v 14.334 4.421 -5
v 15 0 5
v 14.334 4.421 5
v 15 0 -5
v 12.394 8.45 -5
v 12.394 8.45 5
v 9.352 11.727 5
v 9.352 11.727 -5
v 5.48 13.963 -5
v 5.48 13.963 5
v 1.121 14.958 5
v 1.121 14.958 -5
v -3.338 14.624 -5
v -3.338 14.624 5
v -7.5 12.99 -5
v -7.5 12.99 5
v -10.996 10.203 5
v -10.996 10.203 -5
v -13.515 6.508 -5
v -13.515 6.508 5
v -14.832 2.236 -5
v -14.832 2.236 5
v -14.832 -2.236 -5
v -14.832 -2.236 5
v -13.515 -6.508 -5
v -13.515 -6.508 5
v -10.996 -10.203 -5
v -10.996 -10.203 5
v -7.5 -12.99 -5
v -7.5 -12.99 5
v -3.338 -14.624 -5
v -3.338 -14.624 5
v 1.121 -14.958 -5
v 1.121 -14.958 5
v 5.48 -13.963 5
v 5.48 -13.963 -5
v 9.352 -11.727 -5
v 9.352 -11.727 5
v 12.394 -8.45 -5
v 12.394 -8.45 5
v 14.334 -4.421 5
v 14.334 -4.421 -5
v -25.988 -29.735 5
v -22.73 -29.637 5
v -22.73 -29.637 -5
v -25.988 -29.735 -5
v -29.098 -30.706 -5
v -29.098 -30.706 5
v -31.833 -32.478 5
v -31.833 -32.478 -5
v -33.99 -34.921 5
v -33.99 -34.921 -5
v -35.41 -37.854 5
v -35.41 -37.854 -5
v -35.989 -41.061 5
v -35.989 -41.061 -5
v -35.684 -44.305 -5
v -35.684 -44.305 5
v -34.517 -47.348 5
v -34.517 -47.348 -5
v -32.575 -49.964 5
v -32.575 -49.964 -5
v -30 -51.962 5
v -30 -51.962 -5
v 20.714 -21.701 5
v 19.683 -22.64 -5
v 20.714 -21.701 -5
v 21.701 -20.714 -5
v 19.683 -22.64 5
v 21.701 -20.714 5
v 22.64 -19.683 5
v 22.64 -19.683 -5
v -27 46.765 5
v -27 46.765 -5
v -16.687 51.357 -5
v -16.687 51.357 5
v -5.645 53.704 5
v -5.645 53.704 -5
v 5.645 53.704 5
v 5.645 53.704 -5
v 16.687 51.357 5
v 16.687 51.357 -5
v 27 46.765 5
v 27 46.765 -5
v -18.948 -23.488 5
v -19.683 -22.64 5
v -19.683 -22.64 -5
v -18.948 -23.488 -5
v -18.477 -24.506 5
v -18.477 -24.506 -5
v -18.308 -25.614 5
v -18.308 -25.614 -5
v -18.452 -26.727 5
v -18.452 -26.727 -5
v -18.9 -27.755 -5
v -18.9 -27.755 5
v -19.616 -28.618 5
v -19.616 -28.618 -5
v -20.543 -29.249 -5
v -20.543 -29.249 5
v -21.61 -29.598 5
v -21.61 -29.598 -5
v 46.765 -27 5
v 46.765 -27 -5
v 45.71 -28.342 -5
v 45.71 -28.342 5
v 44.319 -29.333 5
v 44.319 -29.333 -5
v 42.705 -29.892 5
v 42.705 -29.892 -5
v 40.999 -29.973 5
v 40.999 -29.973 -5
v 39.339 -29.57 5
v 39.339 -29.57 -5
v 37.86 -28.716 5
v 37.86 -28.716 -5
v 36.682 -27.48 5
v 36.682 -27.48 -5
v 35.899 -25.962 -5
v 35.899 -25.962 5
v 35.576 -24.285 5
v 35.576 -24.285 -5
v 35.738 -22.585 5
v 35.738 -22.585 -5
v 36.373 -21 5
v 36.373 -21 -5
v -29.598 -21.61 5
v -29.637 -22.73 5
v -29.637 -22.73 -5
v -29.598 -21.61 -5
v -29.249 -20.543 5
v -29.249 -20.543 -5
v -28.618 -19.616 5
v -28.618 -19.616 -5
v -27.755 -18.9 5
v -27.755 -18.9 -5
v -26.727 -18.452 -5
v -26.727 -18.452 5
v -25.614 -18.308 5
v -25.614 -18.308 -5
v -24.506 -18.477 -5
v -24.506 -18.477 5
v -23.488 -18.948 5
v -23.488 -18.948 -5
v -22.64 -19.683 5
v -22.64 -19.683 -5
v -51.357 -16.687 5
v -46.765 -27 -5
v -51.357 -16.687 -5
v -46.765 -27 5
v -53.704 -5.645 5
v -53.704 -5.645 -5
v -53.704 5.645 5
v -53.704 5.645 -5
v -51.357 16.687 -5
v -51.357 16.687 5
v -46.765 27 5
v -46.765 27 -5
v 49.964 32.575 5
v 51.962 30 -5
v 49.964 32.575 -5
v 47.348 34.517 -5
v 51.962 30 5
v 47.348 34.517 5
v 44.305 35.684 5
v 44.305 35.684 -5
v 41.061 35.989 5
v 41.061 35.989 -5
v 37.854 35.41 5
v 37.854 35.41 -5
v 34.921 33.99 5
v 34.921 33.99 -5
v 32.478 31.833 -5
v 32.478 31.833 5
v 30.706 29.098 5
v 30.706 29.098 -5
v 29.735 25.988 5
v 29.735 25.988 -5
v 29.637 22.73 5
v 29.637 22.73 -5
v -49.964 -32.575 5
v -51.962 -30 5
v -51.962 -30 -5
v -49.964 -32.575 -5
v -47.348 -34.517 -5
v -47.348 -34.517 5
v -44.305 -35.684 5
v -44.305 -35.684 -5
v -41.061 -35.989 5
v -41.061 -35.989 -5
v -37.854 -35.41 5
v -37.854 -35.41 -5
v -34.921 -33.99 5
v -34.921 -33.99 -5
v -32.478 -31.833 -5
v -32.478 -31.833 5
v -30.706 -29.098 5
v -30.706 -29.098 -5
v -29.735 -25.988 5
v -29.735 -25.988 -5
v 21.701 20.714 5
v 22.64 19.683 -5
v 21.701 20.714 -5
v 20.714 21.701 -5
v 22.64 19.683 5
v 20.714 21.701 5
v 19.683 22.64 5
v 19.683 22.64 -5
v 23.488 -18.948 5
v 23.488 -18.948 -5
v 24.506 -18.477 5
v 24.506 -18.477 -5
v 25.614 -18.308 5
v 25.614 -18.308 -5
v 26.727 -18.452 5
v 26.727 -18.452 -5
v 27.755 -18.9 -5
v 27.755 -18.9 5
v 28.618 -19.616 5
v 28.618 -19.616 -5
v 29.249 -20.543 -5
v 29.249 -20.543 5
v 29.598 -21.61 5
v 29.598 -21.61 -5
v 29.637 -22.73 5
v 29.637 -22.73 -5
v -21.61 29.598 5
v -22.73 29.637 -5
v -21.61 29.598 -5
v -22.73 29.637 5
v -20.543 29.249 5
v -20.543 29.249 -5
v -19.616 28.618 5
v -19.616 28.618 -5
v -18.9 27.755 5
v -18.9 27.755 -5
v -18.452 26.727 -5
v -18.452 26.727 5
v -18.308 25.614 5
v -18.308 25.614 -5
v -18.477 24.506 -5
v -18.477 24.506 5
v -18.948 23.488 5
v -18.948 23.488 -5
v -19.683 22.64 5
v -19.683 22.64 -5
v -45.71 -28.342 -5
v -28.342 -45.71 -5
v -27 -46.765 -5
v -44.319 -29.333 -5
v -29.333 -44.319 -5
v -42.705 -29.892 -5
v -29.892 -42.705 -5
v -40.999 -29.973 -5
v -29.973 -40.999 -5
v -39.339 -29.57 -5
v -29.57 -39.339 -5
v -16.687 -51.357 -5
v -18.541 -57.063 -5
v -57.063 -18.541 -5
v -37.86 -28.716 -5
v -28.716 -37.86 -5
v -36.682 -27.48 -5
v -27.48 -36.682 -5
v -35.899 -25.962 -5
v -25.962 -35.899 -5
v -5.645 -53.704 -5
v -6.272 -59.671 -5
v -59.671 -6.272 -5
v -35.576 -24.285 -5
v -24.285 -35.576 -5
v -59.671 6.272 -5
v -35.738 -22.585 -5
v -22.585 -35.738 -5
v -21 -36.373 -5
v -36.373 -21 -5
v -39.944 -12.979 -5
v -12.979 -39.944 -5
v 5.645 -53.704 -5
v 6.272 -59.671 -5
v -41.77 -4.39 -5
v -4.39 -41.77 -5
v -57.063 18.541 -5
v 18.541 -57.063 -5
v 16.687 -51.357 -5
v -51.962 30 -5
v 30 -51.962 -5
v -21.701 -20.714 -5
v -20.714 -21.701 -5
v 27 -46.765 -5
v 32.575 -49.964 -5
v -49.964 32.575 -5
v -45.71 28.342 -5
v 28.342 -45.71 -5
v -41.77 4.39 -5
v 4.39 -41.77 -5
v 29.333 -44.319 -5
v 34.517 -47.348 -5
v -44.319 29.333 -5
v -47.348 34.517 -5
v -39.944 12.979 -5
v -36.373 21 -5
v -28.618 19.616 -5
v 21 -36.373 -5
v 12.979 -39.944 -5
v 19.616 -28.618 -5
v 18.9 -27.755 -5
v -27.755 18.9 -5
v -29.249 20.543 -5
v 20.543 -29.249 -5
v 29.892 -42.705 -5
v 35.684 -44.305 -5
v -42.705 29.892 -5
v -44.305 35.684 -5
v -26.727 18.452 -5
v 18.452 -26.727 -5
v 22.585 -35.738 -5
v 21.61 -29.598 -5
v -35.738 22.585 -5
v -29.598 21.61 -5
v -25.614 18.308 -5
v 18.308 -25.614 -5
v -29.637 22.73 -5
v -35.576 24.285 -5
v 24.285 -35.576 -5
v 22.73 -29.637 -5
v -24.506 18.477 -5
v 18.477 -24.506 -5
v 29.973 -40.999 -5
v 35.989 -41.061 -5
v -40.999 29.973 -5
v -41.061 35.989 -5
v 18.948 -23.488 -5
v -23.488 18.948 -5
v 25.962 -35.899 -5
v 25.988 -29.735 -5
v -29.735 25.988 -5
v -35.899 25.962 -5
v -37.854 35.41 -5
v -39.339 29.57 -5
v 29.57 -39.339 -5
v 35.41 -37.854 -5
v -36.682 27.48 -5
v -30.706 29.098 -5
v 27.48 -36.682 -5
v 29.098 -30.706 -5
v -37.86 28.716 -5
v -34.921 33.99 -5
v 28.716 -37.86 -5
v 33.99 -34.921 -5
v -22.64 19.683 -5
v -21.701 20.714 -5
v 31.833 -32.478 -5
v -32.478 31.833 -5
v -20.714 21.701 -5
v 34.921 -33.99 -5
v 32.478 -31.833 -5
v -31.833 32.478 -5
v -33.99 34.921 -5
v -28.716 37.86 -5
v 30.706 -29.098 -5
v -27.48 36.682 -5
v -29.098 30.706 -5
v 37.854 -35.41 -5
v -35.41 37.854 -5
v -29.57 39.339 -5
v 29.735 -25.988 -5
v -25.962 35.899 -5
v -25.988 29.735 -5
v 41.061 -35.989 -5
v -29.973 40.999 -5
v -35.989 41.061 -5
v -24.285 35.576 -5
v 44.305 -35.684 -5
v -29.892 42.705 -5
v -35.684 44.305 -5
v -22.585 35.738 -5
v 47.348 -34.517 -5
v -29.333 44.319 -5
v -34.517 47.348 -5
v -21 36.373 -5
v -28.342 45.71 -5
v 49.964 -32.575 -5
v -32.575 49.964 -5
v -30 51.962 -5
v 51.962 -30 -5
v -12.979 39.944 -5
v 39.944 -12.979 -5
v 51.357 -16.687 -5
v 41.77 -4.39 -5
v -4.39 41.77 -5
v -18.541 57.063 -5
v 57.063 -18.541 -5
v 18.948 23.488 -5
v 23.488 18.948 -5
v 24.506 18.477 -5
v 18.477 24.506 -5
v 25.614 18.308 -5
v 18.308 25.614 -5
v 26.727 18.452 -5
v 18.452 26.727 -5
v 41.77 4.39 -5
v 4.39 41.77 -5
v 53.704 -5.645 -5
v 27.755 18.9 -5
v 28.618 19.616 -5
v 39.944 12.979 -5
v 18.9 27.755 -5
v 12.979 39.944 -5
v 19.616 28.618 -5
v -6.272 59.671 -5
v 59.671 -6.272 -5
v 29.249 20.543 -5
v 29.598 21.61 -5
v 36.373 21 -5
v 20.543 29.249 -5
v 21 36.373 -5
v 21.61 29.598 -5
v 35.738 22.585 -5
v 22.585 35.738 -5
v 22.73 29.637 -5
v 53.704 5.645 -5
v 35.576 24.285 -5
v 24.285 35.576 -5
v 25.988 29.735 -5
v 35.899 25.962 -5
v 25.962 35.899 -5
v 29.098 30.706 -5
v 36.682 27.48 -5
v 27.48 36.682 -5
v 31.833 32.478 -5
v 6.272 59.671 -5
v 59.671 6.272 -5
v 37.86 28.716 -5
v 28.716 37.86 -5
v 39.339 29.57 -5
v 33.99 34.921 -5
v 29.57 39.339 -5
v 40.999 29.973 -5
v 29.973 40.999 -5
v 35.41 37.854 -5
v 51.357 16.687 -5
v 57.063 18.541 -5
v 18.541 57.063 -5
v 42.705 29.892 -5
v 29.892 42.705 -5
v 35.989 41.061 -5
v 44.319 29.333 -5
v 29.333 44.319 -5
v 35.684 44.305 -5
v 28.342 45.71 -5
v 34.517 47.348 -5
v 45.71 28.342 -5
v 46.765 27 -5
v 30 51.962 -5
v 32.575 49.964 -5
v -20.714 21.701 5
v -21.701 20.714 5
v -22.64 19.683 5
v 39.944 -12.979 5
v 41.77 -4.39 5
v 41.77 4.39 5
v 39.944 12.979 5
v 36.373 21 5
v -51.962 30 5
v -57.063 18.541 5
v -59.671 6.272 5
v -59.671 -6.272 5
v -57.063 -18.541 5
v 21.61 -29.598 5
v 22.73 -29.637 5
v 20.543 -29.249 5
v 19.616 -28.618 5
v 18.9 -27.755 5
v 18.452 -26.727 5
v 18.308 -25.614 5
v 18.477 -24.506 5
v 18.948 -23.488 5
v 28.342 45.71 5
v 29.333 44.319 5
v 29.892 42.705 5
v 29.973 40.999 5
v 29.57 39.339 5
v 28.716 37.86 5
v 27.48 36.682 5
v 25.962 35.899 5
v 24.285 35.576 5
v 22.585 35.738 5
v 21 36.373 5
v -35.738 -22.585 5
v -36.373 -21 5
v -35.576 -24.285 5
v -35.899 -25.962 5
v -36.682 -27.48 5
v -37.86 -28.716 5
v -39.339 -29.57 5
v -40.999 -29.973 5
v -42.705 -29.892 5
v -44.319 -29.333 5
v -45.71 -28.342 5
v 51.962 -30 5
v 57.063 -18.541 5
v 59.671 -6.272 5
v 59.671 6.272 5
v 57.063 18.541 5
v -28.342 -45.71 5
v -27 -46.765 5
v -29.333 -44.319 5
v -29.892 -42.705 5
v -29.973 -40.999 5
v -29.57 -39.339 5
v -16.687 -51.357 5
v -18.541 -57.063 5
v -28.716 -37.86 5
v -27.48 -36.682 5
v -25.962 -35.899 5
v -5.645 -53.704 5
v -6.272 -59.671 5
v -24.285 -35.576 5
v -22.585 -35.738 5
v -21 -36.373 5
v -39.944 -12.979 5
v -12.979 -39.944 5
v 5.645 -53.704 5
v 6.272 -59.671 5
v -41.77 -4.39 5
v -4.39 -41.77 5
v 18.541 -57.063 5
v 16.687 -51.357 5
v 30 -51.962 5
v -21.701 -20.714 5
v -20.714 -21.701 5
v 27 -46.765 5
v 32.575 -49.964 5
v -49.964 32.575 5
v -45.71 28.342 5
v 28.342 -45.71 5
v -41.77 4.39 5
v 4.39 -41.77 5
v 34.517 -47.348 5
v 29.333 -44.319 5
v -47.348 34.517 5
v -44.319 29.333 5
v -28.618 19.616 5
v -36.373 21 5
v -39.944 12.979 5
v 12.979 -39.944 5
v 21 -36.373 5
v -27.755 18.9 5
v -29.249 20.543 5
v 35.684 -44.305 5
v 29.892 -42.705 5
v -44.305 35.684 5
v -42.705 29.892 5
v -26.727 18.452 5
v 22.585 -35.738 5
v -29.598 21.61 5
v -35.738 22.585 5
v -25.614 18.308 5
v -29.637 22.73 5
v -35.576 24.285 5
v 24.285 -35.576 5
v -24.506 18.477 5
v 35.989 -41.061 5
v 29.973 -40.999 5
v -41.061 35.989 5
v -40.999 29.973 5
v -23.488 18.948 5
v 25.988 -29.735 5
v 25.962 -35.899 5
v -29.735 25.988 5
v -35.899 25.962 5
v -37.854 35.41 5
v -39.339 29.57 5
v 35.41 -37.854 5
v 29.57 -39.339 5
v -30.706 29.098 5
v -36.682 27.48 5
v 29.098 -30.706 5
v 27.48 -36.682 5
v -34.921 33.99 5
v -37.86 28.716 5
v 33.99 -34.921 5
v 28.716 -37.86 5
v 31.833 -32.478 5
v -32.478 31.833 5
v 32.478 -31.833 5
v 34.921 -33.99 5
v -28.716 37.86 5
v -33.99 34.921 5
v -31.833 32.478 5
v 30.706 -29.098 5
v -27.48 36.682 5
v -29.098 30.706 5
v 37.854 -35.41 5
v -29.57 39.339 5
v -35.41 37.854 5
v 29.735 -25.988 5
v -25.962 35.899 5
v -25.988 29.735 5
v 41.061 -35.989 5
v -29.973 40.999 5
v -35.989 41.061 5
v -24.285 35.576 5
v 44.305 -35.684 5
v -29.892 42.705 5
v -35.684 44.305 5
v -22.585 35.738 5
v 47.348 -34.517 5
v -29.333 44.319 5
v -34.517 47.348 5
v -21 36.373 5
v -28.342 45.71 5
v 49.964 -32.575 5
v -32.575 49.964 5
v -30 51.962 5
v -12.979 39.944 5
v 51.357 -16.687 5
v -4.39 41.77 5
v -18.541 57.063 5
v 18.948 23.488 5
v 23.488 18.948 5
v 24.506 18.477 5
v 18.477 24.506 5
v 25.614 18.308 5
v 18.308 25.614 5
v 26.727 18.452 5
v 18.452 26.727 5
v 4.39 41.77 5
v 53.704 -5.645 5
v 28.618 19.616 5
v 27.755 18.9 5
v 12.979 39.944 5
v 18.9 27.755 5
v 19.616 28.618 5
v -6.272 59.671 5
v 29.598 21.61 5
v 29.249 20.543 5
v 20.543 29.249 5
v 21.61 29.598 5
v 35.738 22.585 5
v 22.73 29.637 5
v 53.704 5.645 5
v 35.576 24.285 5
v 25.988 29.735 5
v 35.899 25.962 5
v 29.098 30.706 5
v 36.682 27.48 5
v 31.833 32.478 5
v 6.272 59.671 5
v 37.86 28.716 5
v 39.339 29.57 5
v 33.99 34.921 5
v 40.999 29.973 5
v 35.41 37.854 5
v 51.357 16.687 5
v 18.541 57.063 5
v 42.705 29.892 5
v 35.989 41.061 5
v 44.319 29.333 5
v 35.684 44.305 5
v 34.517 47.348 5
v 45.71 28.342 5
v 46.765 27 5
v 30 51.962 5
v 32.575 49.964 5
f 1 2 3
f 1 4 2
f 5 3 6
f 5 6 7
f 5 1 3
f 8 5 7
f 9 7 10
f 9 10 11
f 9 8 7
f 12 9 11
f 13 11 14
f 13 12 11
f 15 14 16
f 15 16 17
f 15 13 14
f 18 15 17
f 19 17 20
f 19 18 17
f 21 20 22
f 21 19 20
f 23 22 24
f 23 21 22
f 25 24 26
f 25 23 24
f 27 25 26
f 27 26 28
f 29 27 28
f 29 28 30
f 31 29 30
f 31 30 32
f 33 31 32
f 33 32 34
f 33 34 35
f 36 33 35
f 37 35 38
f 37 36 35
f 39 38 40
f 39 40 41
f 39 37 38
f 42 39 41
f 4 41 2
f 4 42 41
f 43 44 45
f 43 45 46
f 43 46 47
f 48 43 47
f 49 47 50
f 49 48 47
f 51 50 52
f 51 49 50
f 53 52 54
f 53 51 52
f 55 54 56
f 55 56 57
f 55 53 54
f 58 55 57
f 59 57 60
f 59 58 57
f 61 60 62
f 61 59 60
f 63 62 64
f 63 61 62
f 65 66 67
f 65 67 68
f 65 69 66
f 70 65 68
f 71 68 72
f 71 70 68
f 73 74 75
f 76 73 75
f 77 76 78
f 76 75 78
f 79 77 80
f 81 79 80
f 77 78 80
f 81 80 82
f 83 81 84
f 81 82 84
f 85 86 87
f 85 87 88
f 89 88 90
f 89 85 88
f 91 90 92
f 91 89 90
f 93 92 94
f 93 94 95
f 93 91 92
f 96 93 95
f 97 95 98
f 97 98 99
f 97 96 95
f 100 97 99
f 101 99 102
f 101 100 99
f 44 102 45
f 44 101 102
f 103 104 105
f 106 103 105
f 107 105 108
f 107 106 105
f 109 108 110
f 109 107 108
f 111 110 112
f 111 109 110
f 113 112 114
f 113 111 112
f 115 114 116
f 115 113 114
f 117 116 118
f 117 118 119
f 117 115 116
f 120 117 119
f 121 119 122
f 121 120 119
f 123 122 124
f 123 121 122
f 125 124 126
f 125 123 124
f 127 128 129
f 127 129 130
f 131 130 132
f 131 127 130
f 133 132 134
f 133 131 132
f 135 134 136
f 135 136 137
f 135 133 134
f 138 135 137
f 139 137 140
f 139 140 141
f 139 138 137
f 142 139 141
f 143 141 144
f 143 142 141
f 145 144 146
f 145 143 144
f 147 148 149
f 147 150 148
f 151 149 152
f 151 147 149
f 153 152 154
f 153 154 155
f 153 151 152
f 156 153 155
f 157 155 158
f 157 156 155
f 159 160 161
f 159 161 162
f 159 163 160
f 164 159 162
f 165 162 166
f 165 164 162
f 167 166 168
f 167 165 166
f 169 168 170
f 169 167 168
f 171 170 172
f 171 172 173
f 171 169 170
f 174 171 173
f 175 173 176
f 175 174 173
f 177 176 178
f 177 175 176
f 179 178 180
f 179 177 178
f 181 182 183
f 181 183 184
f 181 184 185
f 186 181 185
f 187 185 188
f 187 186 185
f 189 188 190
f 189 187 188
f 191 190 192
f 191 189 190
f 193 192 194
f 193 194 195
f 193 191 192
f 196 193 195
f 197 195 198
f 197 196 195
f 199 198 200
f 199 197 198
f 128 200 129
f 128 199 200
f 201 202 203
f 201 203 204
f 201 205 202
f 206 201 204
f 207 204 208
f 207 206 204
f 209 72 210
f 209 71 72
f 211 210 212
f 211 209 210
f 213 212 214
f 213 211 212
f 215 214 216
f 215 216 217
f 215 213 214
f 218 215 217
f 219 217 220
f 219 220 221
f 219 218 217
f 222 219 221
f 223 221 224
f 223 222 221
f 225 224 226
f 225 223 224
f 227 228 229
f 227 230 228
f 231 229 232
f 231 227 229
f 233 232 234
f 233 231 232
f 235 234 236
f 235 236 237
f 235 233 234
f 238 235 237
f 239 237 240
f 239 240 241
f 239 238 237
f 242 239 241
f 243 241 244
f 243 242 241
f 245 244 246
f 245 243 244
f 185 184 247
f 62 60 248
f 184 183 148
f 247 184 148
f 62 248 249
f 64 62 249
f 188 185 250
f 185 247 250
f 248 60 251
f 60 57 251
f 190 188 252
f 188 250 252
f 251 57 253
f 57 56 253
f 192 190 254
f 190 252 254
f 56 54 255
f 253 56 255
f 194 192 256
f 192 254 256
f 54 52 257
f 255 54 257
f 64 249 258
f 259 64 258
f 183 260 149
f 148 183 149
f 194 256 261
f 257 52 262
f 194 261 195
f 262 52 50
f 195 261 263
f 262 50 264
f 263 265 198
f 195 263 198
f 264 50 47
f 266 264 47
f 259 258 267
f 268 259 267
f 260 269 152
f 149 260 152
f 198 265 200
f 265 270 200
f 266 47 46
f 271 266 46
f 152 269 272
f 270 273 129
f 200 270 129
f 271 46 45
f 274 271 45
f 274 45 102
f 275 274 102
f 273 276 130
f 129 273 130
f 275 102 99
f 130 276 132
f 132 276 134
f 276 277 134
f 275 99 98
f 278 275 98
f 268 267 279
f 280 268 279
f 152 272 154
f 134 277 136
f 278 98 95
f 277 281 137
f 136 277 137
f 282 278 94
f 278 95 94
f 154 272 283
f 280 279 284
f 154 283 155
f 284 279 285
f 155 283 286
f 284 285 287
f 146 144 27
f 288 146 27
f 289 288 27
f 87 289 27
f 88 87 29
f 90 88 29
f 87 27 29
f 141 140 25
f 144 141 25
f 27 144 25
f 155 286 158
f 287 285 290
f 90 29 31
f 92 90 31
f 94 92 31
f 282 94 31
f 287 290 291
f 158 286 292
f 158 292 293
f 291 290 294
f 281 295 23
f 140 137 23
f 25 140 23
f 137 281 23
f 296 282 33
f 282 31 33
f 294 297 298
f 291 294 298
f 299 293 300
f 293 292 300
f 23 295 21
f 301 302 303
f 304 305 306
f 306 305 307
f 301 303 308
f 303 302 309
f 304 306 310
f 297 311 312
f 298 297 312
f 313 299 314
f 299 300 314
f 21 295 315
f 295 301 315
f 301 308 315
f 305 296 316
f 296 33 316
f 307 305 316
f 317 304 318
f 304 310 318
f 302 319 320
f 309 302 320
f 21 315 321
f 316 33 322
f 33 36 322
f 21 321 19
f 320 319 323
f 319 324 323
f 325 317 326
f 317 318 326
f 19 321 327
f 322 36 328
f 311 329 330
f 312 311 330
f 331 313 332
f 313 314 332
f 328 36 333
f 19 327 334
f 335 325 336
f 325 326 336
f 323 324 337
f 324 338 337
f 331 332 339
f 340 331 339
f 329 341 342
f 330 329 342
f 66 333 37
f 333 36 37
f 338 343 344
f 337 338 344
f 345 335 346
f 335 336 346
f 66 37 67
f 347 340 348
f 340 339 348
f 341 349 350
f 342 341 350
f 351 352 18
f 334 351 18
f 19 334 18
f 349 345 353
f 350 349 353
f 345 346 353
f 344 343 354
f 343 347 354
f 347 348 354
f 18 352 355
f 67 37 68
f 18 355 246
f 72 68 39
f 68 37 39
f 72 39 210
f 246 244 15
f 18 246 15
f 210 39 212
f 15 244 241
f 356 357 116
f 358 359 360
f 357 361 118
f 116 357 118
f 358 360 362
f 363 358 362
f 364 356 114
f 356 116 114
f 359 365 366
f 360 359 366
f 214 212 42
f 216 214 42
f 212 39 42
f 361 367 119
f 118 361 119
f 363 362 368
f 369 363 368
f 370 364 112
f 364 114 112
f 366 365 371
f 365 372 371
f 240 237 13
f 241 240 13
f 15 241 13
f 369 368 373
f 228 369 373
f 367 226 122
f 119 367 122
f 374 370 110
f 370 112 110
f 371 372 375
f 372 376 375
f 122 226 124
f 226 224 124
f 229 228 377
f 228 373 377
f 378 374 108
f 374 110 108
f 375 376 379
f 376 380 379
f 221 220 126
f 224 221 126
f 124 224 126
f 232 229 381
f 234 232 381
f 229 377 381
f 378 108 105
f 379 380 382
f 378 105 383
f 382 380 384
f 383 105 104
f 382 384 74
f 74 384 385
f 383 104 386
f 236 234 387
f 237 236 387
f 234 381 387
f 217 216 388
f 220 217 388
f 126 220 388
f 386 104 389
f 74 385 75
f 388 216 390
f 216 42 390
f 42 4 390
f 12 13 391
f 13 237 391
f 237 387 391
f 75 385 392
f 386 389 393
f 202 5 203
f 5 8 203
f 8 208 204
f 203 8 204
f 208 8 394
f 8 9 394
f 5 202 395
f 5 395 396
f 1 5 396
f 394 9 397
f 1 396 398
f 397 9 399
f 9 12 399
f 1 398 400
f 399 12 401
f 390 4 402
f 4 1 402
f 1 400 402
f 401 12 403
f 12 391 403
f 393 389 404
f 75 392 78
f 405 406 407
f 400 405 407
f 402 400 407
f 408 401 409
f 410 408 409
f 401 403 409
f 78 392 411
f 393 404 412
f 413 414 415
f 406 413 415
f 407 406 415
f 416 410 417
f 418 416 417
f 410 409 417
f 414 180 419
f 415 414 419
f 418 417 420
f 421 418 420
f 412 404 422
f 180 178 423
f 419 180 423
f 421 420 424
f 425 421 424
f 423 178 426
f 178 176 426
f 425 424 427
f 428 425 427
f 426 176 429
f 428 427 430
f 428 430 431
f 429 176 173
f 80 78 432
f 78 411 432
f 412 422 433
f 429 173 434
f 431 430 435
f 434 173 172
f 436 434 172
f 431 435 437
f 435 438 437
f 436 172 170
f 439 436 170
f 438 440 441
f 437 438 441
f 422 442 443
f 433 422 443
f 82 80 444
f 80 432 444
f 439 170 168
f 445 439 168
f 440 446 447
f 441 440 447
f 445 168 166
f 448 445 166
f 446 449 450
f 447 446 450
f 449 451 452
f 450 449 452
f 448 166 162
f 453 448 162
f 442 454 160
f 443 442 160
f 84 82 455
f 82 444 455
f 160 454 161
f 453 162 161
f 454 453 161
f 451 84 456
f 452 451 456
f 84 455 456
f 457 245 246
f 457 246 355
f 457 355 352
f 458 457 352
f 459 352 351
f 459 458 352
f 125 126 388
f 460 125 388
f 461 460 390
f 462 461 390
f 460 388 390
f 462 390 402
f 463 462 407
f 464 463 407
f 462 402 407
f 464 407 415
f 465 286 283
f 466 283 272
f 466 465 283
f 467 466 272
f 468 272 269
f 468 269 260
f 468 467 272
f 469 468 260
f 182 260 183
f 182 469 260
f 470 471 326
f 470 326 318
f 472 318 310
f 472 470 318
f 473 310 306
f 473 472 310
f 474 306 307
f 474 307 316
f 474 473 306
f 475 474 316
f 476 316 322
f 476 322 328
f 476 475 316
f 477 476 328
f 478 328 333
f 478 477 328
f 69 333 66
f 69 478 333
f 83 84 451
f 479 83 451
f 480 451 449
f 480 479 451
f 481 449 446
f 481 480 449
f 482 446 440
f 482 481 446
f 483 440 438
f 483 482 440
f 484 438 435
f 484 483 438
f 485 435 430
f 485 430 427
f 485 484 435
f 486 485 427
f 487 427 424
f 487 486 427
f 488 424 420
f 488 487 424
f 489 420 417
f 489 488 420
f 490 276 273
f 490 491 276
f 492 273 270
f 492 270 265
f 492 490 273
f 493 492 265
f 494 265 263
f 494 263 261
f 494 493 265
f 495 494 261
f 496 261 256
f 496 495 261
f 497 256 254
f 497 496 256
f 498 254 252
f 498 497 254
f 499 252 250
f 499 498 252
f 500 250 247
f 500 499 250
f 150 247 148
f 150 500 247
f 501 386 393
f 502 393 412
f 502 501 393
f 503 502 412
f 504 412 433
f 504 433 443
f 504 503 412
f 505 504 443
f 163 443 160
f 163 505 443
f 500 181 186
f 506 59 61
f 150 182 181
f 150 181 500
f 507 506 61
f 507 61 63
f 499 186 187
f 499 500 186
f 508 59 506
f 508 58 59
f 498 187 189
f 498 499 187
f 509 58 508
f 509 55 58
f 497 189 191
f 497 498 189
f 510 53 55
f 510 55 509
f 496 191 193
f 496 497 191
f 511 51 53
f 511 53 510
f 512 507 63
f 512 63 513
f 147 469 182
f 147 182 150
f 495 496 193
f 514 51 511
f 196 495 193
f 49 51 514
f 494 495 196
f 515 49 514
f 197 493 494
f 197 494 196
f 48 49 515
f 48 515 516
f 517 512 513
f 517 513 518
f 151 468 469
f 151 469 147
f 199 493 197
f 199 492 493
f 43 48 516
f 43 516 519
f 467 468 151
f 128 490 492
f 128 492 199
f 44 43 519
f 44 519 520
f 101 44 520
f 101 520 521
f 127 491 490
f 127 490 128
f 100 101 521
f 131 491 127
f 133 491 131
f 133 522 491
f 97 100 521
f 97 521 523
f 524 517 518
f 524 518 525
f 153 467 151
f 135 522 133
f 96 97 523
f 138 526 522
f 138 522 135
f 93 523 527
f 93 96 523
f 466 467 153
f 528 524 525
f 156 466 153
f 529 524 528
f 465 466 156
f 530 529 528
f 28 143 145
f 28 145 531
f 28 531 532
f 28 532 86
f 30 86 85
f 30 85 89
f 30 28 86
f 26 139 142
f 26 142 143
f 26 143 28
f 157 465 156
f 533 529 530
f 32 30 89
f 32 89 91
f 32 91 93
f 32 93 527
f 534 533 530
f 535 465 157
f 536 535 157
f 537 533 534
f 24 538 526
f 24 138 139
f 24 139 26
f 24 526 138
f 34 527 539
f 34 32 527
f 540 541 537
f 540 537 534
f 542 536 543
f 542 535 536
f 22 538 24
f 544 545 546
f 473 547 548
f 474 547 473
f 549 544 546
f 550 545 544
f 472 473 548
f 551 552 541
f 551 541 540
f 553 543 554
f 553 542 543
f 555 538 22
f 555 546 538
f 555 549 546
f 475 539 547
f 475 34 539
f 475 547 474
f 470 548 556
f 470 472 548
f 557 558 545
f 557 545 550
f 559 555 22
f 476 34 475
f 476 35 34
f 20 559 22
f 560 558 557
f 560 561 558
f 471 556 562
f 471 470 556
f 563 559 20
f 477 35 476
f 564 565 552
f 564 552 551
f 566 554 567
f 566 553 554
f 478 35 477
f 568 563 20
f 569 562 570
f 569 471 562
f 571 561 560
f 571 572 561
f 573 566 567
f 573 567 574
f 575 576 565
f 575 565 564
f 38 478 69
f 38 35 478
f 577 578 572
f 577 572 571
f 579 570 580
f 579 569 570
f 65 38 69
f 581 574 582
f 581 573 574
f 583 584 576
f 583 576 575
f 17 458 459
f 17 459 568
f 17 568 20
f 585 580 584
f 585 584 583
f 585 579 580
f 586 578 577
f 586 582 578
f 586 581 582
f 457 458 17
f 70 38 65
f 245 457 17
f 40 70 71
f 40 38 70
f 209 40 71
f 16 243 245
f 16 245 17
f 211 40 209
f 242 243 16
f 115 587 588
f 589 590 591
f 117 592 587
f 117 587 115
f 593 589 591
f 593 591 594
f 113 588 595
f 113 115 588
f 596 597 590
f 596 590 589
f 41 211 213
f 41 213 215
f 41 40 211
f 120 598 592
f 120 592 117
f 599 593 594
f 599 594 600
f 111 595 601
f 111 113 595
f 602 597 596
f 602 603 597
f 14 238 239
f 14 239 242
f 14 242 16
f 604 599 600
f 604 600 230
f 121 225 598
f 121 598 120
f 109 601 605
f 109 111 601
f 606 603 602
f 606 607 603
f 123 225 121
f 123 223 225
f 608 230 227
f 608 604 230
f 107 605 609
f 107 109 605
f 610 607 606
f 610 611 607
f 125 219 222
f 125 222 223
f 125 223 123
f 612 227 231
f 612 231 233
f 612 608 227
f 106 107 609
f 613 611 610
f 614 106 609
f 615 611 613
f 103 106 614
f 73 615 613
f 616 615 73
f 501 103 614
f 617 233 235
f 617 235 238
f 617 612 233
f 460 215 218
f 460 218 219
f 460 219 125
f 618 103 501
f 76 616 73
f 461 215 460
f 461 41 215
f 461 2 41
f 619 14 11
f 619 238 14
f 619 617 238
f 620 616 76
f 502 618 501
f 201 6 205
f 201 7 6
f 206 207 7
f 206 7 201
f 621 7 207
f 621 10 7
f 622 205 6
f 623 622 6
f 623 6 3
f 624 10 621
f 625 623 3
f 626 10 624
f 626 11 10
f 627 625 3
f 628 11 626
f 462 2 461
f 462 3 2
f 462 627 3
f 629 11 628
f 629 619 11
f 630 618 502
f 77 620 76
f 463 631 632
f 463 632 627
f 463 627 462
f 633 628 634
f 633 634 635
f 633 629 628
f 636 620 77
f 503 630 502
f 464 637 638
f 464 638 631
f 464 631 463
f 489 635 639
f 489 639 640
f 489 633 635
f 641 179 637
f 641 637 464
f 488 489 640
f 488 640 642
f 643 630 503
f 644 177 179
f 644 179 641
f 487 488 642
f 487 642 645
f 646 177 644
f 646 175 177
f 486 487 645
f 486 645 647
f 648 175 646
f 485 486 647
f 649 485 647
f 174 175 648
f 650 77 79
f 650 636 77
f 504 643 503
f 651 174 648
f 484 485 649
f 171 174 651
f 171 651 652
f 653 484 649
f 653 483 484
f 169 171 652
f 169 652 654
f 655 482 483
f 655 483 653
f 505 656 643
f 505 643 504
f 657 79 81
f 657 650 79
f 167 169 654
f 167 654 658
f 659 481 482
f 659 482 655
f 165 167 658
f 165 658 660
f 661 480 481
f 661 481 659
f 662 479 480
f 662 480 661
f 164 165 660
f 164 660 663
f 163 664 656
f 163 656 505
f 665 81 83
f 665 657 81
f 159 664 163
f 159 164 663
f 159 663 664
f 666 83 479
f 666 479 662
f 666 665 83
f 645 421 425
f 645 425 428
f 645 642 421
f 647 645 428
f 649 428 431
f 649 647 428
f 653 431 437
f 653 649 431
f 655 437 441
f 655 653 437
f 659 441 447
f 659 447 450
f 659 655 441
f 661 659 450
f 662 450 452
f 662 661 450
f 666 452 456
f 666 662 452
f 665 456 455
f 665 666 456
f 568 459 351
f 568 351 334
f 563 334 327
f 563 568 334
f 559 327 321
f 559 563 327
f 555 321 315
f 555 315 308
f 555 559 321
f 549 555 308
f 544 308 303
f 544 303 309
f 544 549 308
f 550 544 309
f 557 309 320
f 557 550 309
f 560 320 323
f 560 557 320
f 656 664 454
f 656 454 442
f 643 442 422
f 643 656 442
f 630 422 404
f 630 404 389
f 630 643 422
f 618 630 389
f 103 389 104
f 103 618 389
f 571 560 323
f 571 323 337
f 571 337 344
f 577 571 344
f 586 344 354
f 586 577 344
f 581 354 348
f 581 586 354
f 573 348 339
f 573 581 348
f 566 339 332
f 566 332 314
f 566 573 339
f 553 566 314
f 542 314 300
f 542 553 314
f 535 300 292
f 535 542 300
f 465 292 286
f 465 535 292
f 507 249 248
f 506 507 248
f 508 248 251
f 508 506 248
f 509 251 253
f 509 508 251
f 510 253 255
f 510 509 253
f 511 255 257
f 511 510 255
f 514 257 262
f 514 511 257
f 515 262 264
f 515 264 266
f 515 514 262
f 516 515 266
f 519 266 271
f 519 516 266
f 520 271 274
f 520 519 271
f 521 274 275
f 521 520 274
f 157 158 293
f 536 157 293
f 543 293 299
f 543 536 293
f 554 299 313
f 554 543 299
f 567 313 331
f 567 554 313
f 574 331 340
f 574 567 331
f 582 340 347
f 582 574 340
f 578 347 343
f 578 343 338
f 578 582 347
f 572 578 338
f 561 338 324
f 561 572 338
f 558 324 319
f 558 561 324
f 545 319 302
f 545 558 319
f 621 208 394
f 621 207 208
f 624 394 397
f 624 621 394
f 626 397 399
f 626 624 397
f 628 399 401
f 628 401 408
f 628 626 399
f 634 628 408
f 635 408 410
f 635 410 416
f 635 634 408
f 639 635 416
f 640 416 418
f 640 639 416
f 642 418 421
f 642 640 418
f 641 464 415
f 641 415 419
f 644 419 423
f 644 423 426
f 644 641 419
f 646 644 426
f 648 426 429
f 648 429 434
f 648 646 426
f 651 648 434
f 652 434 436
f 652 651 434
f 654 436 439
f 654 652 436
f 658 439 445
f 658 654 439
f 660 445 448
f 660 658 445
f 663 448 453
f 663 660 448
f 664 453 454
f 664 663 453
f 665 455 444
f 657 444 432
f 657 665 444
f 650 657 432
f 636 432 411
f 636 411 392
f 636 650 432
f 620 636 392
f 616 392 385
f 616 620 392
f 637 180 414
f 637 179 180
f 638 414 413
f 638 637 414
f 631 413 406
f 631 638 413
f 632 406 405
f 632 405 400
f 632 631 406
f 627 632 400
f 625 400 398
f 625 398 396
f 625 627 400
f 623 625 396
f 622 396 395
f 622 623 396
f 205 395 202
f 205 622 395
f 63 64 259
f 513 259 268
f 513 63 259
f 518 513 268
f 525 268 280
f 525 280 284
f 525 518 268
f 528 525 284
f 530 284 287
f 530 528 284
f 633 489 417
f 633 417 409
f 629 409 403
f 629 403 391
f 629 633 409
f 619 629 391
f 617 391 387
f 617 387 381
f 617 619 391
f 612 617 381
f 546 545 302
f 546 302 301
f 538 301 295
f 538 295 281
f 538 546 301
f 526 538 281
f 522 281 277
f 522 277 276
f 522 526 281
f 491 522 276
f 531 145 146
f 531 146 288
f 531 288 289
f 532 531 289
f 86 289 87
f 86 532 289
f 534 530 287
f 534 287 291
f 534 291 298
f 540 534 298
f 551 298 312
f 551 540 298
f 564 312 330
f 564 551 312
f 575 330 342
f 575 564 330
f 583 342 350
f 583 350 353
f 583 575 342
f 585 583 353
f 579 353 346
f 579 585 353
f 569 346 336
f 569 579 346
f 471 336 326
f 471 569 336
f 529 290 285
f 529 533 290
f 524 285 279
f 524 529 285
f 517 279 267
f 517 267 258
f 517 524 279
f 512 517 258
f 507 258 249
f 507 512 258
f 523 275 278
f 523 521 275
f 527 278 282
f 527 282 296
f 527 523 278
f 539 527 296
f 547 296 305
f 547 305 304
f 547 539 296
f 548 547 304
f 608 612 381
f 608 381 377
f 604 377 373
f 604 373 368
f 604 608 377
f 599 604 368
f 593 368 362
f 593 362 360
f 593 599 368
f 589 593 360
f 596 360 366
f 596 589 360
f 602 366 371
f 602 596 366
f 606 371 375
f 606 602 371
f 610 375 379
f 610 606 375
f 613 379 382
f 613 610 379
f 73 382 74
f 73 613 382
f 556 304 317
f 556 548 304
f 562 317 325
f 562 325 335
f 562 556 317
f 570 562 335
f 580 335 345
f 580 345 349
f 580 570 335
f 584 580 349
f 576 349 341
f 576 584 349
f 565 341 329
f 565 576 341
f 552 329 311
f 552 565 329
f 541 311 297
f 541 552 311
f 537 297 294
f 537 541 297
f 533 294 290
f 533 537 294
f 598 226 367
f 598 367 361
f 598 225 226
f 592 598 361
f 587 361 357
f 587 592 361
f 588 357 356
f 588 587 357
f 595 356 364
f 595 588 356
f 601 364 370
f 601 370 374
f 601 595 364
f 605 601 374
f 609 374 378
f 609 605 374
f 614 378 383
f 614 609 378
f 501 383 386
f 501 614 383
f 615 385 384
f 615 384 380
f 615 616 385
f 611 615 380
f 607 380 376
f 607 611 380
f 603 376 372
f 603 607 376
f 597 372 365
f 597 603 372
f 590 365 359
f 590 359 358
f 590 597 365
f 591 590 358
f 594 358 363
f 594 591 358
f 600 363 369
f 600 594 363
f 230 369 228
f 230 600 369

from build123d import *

# Parameters (mm, degrees)
SKETCH2_R           = 15
BOSS_EXTRUDE1_DEPTH = 5


with BuildPart() as part:
    # Sketch2 → Boss-Extrude1 (new, symmetric)
    with BuildSketch(Plane.XY):
        with BuildLine():
            ThreePointArc((-22.73046694, 29.636563105), (-18.64010484, 27.256433461), (-19.682902282, 22.640303835))
            ThreePointArc((-19.682902282, 22.640303835), (-21.213203436, 21.213203436), (-22.640303835, 19.682902282))
            ThreePointArc((-22.640303835, 19.682902282), (-27.256433461, 18.64010484), (-29.636563105, 22.73046694))
            ThreePointArc((-29.636563105, 22.73046694), (-37.853751933, 35.41031558), (-51.961524227, 30))
            ThreePointArc((-51.961524227, 30), (-60, 0), (-51.961524227, -30))
            ThreePointArc((-51.961524227, -30), (-37.853751933, -35.41031558), (-29.636563105, -22.73046694))
            ThreePointArc((-29.636563105, -22.73046694), (-27.256433461, -18.64010484), (-22.640303835, -19.682902282))
            ThreePointArc((-22.640303835, -19.682902282), (-21.213203436, -21.213203436), (-19.682902282, -22.640303835))
            ThreePointArc((-19.682902282, -22.640303835), (-18.64010484, -27.256433461), (-22.73046694, -29.636563105))
            ThreePointArc((-22.73046694, -29.636563105), (-35.41031558, -37.853751933), (-30, -51.961524227))
            ThreePointArc((-30, -51.961524227), (0, -60), (30, -51.961524227))
            ThreePointArc((30, -51.961524227), (35.41031558, -37.853751933), (22.73046694, -29.636563105))
            ThreePointArc((22.73046694, -29.636563105), (18.64010484, -27.256433461), (19.682902282, -22.640303835))
            ThreePointArc((19.682902282, -22.640303835), (21.213203436, -21.213203436), (22.640303835, -19.682902282))
            ThreePointArc((22.640303835, -19.682902282), (27.256433461, -18.64010484), (29.636563105, -22.73046694))
            ThreePointArc((29.636563105, -22.73046694), (37.853751933, -35.41031558), (51.961524227, -30))
            ThreePointArc((51.961524227, -30), (60, 0), (51.961524227, 30))
            ThreePointArc((51.961524227, 30), (37.853751933, 35.41031558), (29.636563105, 22.73046694))
            ThreePointArc((29.636563105, 22.73046694), (27.256433461, 18.64010484), (22.640303835, 19.682902282))
            ThreePointArc((22.640303835, 19.682902282), (21.213203436, 21.213203436), (19.682902282, 22.640303835))
            ThreePointArc((19.682902282, 22.640303835), (18.64010484, 27.256433461), (22.73046694, 29.636563105))
            ThreePointArc((22.73046694, 29.636563105), (35.41031558, 37.853751933), (30, 51.961524227))
            ThreePointArc((30, 51.961524227), (0, 60), (-30, 51.961524227))
            ThreePointArc((-30, 51.961524227), (-35.41031558, 37.853751933), (-22.73046694, 29.636563105))
        make_face()
        Circle(SKETCH2_R, mode=Mode.SUBTRACT)
        with BuildLine():
            ThreePointArc((-21, 36.373066959), (-29.196152423, 38.569219382), (-27, 46.765371804))
            ThreePointArc((-27, 46.765371804), (0, 54), (27, 46.765371804))
            ThreePointArc((27, 46.765371804), (29.196152423, 38.569219382), (21, 36.373066959))
            ThreePointArc((21, 36.373066959), (0, 42), (-21, 36.373066959))
        make_face(mode=Mode.SUBTRACT)
        with BuildLine():
            ThreePointArc((-46.765371804, 27), (-38.569219382, 29.196152423), (-36.373066959, 21))
            ThreePointArc((-36.373066959, 21), (-42, 0), (-36.373066959, -21))
            ThreePointArc((-36.373066959, -21), (-38.569219382, -29.196152423), (-46.765371804, -27))
            ThreePointArc((-46.765371804, -27), (-54, 0), (-46.765371804, 27))
        make_face(mode=Mode.SUBTRACT)
        with BuildLine():
            ThreePointArc((46.765371804, -27), (38.569219382, -29.196152423), (36.373066959, -21))
            ThreePointArc((36.373066959, -21), (42, 0), (36.373066959, 21))
            ThreePointArc((36.373066959, 21), (38.569219382, 29.196152423), (46.765371804, 27))
            ThreePointArc((46.765371804, 27), (54, 0), (46.765371804, -27))
        make_face(mode=Mode.SUBTRACT)
        with BuildLine():
            ThreePointArc((-27, -46.765371804), (-29.196152423, -38.569219382), (-21, -36.373066959))
            ThreePointArc((-21, -36.373066959), (0, -42), (21, -36.373066959))
            ThreePointArc((21, -36.373066959), (29.196152423, -38.569219382), (27, -46.765371804))
            ThreePointArc((27, -46.765371804), (0, -54), (-27, -46.765371804))
        make_face(mode=Mode.SUBTRACT)
    extrude(amount=BOSS_EXTRUDE1_DEPTH, both=True)


solid = part.part
